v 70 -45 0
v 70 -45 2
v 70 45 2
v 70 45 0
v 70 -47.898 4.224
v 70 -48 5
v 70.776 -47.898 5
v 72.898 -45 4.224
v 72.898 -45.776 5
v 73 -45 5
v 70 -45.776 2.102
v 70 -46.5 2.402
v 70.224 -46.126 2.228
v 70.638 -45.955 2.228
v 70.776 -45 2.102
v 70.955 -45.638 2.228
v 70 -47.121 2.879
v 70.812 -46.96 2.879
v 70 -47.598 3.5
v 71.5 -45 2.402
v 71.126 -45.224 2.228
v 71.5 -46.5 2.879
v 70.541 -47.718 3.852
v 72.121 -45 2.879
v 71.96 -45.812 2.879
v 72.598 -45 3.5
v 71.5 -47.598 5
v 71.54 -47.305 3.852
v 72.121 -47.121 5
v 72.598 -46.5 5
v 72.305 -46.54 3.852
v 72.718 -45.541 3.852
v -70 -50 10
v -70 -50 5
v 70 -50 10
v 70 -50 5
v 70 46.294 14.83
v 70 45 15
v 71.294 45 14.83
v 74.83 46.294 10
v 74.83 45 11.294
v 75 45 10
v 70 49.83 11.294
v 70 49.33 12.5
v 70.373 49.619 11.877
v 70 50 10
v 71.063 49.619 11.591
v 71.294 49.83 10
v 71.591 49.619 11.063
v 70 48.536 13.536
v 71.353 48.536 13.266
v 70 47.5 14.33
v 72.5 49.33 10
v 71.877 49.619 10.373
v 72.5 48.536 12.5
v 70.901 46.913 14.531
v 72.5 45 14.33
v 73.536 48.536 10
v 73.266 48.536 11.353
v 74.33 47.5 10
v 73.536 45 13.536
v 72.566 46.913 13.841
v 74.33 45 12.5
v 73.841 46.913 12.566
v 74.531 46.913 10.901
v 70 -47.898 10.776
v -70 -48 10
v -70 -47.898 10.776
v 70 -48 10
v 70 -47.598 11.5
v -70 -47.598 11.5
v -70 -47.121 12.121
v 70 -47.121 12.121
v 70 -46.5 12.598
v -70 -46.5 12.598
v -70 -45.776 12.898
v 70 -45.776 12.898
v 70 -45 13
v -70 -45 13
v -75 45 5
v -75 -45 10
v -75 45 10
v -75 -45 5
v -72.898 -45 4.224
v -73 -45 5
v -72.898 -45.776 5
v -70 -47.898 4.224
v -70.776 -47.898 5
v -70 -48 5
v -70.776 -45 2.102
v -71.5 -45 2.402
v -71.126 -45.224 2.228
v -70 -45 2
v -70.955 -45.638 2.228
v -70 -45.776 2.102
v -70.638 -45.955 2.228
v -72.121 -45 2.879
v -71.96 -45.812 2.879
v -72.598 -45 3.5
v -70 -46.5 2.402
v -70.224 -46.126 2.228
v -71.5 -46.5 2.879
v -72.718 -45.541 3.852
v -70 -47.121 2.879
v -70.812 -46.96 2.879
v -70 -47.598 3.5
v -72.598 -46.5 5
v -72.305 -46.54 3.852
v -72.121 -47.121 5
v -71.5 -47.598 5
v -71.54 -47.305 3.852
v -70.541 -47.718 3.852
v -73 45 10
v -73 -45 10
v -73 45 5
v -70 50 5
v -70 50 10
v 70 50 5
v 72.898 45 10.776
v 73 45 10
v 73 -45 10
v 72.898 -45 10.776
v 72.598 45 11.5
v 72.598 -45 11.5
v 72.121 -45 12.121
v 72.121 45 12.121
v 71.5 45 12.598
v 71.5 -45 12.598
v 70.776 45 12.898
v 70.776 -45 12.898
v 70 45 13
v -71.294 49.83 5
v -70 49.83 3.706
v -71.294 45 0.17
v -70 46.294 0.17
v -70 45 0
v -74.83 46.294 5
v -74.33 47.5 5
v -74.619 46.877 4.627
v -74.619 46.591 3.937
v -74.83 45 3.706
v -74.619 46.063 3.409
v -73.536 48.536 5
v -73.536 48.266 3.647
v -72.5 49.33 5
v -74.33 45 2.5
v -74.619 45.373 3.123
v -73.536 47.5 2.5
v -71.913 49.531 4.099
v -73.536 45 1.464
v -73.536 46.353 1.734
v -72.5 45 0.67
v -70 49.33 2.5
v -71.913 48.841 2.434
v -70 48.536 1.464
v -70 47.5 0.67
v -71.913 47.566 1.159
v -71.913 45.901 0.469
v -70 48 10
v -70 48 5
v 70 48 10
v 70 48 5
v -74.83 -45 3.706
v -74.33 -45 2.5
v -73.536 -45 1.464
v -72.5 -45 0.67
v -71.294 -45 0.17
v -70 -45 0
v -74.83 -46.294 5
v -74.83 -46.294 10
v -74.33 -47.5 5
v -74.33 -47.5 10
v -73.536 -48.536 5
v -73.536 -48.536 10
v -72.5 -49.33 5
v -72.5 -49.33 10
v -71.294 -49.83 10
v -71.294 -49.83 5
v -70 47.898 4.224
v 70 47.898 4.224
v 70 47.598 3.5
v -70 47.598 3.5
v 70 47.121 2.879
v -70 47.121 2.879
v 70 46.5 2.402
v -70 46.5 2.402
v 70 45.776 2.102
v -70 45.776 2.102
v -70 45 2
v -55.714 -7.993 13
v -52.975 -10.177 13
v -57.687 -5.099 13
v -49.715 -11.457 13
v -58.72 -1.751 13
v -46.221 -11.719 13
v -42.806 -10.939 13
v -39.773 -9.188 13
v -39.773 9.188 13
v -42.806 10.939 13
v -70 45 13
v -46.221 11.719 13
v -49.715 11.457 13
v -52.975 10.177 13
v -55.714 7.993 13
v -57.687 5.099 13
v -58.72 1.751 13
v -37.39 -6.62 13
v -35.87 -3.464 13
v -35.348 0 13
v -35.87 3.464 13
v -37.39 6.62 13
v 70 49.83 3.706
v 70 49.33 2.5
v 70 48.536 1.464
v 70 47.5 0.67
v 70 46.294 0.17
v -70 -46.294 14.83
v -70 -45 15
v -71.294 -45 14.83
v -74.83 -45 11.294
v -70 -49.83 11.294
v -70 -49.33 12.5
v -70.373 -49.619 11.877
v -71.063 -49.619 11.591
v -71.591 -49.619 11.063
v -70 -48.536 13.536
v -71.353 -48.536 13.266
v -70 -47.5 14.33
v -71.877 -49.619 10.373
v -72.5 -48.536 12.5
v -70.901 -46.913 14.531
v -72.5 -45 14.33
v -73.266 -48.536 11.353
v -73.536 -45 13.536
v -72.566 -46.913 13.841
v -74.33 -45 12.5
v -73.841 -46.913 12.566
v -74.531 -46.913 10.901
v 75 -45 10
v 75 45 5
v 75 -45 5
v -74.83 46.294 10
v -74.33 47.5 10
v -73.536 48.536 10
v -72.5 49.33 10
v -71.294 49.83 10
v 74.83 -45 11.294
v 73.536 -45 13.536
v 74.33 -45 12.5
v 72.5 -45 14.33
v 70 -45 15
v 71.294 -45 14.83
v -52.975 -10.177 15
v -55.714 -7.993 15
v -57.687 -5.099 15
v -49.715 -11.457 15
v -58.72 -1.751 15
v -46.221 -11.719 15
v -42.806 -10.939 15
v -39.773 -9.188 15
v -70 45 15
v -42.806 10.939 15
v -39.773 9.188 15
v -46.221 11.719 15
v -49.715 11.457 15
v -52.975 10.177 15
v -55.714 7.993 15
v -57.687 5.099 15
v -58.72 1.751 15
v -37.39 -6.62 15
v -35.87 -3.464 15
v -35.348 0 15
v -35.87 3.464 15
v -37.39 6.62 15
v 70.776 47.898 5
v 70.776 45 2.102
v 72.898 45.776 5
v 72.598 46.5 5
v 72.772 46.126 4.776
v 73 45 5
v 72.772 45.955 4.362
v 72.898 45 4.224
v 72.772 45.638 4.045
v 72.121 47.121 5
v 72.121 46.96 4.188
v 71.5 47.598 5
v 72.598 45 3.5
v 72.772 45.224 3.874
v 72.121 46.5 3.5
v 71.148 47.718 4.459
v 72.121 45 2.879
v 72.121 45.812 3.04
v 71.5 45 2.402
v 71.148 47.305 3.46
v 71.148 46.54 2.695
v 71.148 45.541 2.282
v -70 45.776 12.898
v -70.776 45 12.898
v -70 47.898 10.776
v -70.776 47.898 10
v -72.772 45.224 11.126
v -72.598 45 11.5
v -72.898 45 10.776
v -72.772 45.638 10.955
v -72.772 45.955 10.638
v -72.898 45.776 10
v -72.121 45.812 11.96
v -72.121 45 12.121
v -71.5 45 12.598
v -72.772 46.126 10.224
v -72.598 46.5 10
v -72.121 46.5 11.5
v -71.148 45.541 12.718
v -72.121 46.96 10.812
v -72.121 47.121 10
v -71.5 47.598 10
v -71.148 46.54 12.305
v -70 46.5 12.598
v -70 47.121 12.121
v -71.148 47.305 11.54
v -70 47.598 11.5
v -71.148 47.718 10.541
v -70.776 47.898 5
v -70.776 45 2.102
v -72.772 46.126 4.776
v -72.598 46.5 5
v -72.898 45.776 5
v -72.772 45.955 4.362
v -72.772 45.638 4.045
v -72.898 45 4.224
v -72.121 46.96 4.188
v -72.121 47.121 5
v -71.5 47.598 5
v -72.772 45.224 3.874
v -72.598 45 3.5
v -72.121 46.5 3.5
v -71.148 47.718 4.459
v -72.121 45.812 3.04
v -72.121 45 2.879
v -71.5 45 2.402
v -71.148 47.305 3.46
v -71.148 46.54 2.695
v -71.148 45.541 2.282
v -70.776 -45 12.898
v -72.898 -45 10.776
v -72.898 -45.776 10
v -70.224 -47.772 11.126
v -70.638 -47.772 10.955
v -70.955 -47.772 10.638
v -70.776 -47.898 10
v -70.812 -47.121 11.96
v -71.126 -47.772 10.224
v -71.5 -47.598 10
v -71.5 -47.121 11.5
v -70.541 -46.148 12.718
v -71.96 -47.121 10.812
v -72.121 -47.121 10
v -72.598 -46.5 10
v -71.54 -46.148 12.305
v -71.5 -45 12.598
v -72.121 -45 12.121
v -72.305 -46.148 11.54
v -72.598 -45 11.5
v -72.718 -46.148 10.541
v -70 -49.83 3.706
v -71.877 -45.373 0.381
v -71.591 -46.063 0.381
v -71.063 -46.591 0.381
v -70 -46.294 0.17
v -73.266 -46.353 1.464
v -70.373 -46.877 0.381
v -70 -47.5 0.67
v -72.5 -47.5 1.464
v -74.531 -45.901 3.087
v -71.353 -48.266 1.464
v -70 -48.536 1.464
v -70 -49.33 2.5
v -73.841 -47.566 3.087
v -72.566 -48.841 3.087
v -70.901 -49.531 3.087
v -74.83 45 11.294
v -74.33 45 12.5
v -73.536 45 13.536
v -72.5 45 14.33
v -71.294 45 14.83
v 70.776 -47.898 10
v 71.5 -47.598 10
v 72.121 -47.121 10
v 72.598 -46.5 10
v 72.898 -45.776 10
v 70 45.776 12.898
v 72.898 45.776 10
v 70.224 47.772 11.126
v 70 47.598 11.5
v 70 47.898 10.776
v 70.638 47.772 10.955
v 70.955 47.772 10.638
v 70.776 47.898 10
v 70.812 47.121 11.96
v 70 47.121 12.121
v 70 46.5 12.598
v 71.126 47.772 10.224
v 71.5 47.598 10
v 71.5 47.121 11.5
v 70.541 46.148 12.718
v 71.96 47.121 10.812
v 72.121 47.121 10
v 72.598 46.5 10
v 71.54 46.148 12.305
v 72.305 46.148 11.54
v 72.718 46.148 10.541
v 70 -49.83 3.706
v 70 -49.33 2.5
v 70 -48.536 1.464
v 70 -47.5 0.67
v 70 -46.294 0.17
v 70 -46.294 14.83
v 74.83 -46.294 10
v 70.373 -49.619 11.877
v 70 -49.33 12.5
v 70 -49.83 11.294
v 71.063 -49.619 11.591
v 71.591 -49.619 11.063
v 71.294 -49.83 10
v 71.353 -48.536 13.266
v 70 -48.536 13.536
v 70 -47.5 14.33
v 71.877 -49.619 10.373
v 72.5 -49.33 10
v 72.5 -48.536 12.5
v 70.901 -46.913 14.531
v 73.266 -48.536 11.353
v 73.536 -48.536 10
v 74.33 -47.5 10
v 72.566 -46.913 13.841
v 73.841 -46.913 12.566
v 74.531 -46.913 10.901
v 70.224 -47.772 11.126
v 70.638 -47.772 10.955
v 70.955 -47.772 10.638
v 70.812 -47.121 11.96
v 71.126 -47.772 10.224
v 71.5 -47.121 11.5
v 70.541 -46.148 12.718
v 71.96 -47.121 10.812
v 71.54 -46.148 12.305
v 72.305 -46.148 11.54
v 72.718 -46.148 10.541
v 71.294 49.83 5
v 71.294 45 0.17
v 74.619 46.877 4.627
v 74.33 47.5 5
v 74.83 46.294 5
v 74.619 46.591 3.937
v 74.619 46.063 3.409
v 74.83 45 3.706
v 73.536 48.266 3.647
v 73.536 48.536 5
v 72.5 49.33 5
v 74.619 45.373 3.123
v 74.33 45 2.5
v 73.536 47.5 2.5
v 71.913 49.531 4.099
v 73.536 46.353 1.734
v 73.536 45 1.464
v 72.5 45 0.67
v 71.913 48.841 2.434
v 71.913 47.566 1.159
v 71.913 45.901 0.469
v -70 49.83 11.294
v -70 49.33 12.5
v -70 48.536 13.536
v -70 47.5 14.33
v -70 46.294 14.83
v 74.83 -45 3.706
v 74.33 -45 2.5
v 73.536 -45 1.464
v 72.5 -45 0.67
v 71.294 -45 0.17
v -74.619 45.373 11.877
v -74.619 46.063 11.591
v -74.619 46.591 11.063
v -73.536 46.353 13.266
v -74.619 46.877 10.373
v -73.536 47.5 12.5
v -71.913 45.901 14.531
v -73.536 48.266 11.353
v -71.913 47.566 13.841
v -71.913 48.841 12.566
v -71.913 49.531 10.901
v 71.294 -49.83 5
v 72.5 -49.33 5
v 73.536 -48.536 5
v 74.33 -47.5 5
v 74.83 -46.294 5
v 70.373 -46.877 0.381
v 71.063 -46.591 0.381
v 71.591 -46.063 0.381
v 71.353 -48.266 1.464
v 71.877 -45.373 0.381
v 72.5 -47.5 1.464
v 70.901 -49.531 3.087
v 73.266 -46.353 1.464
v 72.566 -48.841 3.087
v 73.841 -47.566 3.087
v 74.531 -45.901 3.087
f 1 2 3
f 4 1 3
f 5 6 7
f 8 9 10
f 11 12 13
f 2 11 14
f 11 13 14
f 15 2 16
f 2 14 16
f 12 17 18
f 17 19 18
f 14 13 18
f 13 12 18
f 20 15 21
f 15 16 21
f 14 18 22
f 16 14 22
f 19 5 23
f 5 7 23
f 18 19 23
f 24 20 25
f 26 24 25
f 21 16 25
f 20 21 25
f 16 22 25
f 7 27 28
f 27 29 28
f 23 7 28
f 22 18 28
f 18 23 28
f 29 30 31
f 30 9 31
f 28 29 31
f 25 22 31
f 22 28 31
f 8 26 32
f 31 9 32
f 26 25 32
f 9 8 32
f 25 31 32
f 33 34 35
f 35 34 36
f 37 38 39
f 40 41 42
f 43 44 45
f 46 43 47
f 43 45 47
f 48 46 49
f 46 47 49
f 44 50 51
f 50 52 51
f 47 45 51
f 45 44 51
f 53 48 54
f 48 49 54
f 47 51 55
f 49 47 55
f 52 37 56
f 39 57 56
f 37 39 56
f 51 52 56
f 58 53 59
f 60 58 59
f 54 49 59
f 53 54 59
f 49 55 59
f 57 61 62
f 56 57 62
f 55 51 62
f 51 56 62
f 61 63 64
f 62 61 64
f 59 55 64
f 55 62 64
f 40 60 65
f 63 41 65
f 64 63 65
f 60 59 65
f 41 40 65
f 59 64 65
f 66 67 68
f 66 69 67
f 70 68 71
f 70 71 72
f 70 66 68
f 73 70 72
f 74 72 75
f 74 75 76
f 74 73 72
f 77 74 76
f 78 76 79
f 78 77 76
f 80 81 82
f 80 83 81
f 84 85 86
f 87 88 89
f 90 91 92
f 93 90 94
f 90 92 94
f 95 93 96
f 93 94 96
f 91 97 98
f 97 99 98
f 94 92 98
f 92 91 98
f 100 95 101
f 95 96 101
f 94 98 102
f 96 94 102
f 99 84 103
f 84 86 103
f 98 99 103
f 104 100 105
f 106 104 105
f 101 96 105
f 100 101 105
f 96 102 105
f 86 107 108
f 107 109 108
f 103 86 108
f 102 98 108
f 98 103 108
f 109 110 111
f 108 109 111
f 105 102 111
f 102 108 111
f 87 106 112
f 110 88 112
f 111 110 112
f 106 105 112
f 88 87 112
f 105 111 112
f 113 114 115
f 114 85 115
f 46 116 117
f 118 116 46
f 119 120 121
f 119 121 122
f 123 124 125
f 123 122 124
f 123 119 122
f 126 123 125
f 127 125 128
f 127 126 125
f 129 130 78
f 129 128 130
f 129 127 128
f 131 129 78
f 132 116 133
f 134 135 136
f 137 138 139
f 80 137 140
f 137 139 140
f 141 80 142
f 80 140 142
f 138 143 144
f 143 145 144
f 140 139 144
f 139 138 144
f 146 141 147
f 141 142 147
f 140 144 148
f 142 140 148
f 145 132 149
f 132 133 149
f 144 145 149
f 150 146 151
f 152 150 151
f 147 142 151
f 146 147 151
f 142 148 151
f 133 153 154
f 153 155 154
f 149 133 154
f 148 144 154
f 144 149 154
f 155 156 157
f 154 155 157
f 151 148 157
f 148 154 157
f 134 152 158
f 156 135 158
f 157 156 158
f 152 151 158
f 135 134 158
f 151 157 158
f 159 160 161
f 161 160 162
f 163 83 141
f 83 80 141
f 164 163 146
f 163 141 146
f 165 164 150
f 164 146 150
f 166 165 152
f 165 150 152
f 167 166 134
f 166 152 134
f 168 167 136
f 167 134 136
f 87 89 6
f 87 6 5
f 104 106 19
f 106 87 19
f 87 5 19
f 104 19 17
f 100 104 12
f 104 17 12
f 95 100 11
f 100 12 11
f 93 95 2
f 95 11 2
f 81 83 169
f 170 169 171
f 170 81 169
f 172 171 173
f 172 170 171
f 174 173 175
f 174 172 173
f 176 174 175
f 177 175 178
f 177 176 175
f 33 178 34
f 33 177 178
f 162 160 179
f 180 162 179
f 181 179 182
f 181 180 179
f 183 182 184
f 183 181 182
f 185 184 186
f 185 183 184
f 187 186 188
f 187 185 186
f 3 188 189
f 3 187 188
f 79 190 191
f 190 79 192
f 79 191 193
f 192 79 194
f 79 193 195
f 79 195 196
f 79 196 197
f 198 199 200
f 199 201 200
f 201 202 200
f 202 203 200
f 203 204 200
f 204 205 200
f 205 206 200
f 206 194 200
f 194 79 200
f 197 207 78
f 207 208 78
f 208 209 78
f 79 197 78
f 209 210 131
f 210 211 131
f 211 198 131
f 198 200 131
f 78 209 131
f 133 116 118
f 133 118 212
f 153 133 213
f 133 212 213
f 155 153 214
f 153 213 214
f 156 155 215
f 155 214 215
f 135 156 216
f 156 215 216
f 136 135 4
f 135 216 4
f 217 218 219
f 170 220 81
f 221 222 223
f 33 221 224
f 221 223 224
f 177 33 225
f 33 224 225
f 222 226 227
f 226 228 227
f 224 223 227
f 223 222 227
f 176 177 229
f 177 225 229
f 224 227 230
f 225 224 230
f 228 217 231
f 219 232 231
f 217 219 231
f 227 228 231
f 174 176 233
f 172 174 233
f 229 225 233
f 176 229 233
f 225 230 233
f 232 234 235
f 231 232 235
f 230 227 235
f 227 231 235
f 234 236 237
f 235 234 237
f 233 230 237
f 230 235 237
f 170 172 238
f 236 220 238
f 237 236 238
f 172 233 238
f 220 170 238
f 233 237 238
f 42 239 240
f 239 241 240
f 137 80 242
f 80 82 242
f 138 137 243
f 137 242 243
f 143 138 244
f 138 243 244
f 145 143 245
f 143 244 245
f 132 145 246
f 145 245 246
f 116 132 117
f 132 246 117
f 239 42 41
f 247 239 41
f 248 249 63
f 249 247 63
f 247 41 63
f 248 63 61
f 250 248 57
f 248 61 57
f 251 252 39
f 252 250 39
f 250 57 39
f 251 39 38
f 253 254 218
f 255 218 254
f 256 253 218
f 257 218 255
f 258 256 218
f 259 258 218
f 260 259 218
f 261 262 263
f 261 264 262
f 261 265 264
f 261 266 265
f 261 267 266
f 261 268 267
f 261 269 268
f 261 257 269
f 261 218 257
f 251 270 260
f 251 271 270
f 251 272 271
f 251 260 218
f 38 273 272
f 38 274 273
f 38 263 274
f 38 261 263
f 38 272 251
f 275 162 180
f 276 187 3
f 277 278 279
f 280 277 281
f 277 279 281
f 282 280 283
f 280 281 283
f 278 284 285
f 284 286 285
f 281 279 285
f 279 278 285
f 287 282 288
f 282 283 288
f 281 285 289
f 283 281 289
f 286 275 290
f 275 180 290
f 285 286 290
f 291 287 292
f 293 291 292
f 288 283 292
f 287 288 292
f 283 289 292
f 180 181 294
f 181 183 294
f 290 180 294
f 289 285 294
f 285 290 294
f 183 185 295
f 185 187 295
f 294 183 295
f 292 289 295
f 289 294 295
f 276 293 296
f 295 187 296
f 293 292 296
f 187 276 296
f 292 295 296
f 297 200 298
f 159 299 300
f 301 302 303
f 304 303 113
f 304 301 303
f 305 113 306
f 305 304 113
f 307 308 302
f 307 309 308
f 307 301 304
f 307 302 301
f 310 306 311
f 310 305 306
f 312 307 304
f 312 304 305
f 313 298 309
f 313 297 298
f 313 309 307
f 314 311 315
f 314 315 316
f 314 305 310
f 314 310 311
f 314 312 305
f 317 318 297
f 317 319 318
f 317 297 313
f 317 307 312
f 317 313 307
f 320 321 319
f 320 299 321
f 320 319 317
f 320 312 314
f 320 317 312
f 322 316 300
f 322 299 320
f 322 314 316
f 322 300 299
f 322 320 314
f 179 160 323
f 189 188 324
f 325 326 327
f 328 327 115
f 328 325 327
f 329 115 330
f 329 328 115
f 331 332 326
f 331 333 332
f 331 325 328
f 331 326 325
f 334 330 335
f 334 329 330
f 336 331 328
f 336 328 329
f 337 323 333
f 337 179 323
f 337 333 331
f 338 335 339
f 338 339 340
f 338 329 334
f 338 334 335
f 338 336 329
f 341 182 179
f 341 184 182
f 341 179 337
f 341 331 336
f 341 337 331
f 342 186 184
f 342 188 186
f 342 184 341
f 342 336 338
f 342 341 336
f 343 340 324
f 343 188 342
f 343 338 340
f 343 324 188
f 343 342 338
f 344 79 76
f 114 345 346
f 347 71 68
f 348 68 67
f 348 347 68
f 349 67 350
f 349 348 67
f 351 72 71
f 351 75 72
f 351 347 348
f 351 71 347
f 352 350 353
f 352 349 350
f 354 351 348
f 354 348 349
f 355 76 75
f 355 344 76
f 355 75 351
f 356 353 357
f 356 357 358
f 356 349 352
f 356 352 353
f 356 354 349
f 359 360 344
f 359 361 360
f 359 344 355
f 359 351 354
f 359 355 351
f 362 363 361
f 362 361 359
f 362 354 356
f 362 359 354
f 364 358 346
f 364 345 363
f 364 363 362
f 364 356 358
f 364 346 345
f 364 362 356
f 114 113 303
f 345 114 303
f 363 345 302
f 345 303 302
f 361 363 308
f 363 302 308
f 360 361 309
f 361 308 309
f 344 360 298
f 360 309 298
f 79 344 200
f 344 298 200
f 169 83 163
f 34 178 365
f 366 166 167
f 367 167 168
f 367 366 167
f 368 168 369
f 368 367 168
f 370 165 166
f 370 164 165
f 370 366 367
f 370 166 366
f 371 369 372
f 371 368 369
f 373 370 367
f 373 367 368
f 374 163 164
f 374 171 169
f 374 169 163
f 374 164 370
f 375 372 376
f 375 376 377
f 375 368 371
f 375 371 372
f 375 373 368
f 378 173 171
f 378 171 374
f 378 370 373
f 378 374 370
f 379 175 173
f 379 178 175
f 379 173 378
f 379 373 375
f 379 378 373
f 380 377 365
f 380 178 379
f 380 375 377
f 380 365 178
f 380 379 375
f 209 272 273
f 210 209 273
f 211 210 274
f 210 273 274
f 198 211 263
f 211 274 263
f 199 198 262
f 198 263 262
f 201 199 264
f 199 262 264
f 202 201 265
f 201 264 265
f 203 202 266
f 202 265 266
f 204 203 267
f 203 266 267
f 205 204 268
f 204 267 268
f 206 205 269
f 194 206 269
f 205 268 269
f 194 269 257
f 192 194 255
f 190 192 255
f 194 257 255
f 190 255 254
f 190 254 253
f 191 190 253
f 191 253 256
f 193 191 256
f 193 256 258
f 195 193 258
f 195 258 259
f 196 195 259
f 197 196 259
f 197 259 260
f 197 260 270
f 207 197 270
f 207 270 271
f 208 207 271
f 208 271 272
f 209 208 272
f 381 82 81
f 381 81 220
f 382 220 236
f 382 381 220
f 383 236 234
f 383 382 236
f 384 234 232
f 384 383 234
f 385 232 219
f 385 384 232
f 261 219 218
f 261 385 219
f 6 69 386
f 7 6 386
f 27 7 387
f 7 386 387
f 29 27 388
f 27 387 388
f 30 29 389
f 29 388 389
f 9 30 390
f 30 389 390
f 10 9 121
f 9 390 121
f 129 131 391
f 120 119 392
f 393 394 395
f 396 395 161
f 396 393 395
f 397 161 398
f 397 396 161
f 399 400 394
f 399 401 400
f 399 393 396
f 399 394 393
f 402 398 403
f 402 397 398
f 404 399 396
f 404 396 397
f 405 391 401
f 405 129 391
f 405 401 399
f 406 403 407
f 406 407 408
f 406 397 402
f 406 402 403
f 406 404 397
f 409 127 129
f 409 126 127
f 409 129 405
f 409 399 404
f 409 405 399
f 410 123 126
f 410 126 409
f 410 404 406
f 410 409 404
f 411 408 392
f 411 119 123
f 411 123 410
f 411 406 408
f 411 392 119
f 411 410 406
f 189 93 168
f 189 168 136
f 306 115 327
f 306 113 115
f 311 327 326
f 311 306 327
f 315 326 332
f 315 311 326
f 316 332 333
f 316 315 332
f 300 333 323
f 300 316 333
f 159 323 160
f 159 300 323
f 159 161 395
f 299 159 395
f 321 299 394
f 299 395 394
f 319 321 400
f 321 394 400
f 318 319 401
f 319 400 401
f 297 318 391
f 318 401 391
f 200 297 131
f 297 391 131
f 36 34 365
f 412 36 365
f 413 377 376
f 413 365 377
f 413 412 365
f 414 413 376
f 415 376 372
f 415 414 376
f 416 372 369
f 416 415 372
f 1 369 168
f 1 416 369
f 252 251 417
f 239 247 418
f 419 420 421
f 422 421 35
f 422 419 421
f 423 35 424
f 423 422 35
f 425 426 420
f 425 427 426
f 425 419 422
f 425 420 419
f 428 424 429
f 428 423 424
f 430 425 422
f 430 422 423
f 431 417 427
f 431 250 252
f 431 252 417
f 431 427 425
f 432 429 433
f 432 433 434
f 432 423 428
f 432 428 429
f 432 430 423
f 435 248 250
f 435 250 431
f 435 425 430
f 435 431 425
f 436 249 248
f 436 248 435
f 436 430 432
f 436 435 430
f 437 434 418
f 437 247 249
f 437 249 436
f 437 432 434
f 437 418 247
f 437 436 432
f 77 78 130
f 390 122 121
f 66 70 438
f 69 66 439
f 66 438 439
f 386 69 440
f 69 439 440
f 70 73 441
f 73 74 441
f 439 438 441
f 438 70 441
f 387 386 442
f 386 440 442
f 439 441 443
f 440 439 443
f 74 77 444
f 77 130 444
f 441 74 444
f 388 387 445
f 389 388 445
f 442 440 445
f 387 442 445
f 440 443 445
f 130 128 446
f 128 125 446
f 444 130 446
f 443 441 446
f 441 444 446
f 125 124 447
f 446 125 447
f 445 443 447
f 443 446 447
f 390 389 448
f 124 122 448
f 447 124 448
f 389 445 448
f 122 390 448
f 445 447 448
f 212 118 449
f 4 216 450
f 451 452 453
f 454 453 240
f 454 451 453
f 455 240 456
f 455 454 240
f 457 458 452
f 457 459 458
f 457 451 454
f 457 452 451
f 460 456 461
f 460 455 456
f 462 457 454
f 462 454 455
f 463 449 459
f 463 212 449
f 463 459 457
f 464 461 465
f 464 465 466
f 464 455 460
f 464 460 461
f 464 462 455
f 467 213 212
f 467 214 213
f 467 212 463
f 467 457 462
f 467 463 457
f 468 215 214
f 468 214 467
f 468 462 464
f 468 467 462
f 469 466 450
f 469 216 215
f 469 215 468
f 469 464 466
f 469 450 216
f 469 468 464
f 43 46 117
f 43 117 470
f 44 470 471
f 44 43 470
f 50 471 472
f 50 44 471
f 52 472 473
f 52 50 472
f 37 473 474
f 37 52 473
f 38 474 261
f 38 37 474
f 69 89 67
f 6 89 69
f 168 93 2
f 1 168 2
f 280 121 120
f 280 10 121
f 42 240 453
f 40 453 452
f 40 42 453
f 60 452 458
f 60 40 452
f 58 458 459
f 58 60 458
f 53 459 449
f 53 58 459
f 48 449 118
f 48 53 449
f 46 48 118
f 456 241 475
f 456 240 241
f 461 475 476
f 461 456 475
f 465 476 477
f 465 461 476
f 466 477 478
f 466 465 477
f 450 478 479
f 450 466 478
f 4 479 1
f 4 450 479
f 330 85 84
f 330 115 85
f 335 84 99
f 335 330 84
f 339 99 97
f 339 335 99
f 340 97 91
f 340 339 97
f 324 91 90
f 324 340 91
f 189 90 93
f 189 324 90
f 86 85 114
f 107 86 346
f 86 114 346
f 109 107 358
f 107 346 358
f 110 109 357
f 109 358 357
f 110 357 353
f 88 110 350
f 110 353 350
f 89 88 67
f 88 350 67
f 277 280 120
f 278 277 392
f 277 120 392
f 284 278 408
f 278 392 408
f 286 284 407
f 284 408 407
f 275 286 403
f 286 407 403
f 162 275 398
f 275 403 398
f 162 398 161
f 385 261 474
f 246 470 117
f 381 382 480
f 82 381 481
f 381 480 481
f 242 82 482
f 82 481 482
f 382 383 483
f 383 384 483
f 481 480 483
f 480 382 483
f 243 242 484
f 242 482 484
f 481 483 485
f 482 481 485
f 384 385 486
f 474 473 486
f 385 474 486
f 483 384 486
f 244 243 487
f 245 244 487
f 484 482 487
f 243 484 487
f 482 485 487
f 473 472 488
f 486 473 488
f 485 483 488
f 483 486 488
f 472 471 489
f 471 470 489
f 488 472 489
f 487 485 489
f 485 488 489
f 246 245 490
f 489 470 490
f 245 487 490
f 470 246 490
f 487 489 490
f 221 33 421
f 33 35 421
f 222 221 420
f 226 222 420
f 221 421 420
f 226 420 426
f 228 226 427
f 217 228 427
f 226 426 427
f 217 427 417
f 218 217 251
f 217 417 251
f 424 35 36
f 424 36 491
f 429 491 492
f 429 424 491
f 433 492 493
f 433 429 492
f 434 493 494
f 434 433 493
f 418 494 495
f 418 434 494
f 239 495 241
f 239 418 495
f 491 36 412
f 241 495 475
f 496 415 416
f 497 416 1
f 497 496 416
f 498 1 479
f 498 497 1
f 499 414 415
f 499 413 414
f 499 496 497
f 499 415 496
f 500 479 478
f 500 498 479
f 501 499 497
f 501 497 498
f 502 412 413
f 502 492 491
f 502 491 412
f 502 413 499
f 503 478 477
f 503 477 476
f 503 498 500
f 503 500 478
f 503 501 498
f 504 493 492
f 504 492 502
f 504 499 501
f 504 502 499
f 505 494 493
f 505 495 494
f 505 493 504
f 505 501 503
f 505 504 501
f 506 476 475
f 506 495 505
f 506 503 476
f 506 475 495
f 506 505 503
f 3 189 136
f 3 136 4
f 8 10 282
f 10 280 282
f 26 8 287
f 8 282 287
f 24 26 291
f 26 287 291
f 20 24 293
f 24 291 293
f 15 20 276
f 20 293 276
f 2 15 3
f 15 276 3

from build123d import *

# Parameters (mm, degrees)
F0_W     = 150
F0_H     = 100
F1_DEPTH = 15
F2_R     = 5
F3_T     = -2
F4_R     = 11.751583661
F5_DEPTH = 25


# Not quite as in the source:
# - a shell that OpenCascade refuses in one call is made with other operations: the cavity is built on its own and cut out


with BuildPart() as f1:
    # F0 (on Top) → F1 (new body)
    with BuildSketch(Plane.XY):
        Rectangle(F0_W, F0_H)
    extrude(amount=F1_DEPTH)

    # F2
    f2_edges = [f1.edges().sort_by_distance(p)[0] for p in [
        (0, 50, 0),
        (75, 0, 15),
        (0, 50, 15),
        (-75, 0, 15),
        (0, -50, 15),
        (-75, 50, 7.5),
        (-75, -50, 7.5),
        (-75, 0, 0),
        (75, -50, 7.5),
        (0, -50, 0),
        (75, 50, 7.5),
        (75, 0, 0),
    ]]
    fillet(f2_edges, radius=F2_R)

    # F3: a shell. OpenCascade refuses it in one call, so the cavity is built on its own and cut out:
    # the body offset inwards by the wall thickness, plus a prism from it out through each open face.
    f3_core = offset(f1.part, amount=F3_T, mode=Mode.PRIVATE)
    f3_exits = [f3_core.faces().sort_by_distance(p)[0] for p in [
        (0, 0, 2),
    ]]
    add(f3_core, mode=Mode.SUBTRACT)
    extrude(f3_exits, amount=-F3_T, mode=Mode.SUBTRACT)

    # F4 (on face) → F5 (cut)
    with BuildSketch(Plane.XY.offset(15)):
        with Locations((-47.0996387303, 0)):
            Circle(F4_R)
    extrude(amount=-F5_DEPTH, mode=Mode.SUBTRACT)


solid = f1.part
